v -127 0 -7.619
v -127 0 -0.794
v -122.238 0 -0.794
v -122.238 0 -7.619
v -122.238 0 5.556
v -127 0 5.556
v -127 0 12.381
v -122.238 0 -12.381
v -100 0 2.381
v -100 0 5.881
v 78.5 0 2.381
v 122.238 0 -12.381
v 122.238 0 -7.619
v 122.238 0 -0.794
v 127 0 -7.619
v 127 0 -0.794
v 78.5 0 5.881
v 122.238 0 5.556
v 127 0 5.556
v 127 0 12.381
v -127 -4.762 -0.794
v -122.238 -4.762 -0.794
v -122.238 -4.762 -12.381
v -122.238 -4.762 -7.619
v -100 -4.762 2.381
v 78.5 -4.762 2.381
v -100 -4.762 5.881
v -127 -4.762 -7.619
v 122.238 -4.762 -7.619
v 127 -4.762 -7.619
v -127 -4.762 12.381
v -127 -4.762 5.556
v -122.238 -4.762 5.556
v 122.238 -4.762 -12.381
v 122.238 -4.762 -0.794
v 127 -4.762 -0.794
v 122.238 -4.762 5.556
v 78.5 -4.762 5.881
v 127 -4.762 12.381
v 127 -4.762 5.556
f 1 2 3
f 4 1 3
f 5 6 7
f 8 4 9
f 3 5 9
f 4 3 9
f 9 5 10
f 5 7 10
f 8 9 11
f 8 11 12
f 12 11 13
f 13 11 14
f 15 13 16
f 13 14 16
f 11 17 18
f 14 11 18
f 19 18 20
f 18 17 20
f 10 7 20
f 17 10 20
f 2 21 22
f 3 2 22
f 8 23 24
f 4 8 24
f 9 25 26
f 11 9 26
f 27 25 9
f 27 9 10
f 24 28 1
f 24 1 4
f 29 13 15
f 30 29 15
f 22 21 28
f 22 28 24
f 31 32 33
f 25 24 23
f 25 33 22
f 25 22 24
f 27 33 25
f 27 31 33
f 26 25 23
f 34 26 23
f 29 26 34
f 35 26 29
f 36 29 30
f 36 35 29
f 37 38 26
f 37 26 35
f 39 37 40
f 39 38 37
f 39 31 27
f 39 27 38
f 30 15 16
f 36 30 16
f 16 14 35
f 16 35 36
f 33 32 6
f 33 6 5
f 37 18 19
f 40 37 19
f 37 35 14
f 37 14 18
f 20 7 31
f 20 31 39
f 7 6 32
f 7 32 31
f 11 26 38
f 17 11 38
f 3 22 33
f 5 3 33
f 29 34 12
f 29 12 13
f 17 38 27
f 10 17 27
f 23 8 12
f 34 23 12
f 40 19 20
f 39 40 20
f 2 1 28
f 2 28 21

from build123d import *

# Parameters (mm, degrees)
F0_W     = 254
F0_H     = 24.7625
F1_DEPTH = 4.7625
F2_W     = 4.7625
F2_H     = 6.35
F3_DEPTH = 25.4
F4_W     = 4.7625
F4_H     = 4.7625
F5_DEPTH = 25.4
F6_W     = 5.5
F6_H     = 3.5
F6_W_2   = 2.5
F6_W_3   = 3
F7_DEPTH = 25.4


with BuildPart() as f1:
    # F0 (on Front) → F1 (new body)
    with BuildSketch(Plane.XZ):
        Rectangle(F0_W, F0_H)
    extrude(amount=F1_DEPTH)

    # F2 (on face) → F3 (cut)
    with BuildSketch(Plane.XZ.offset(4.7625)):
        with Locations((-124.61875, 2.38125)):
            Rectangle(F2_W, F2_H)
        with Locations((124.61875, 2.38125)):
            Rectangle(F2_W, F2_H)
    extrude(amount=-F3_DEPTH, mode=Mode.SUBTRACT)

    # F4 (on face) → F5 (cut)
    with BuildSketch(Plane.XZ.offset(4.7625)):
        with Locations((124.61875, -10)):
            Rectangle(F4_W, F4_H)
        with Locations((-124.61875, -10)):
            Rectangle(F4_W, F4_H)
    extrude(amount=-F5_DEPTH, mode=Mode.SUBTRACT)

    # F6 (on face) → F7 (cut)
    with BuildSketch(Plane.XZ.offset(4.7625)):
        with Locations((-97.250009, 4.13125)):
            Rectangle(F6_W, F6_H)
        with Locations((-93.250009, 4.13125)):
            Rectangle(F6_W_2, F6_H)
        with Locations((-90.500009, 4.13125)):
            Rectangle(F6_W_3, F6_H)
        with Locations((-87.750009, 4.13125)):
            Rectangle(F6_W_2, F6_H)
        with Locations((-85.000009, 4.13125)):
            Rectangle(F6_W_3, F6_H)
        with Locations((-82.250009, 4.13125)):
            Rectangle(F6_W_2, F6_H)
        with Locations((-79.500009, 4.13125)):
            Rectangle(F6_W_3, F6_H)
        with Locations((-76.750009, 4.13125)):
            Rectangle(F6_W_2, F6_H)
        with Locations((-74.000009, 4.13125)):
            Rectangle(F6_W_3, F6_H)
        with Locations((-71.250009, 4.13125)):
            Rectangle(F6_W_2, F6_H)
        with Locations((-68.500009, 4.13125)):
            Rectangle(F6_W_3, F6_H)
        with Locations((-65.750009, 4.13125)):
            Rectangle(F6_W_2, F6_H)
        with Locations((-63.000009, 4.13125)):
            Rectangle(F6_W_3, F6_H)
        with Locations((-60.250009, 4.13125)):
            Rectangle(F6_W_2, F6_H)
        with Locations((-57.500009, 4.13125)):
            Rectangle(F6_W_3, F6_H)
        with Locations((-54.750009, 4.13125)):
            Rectangle(F6_W_2, F6_H)
        with Locations((-52.000009, 4.13125)):
            Rectangle(F6_W_3, F6_H)
        with Locations((-49.250009, 4.13125)):
            Rectangle(F6_W_2, F6_H)
        with Locations((-46.500009, 4.13125)):
            Rectangle(F6_W_3, F6_H)
        with Locations((-43.750009, 4.13125)):
            Rectangle(F6_W_2, F6_H)
        with Locations((-41.000009, 4.13125)):
            Rectangle(F6_W_3, F6_H)
        with Locations((-38.250009, 4.13125)):
            Rectangle(F6_W_2, F6_H)
        with Locations((-35.500009, 4.13125)):
            Rectangle(F6_W_3, F6_H)
        with Locations((-32.750009, 4.13125)):
            Rectangle(F6_W_2, F6_H)
        with Locations((-30.000009, 4.13125)):
            Rectangle(F6_W_3, F6_H)
        with Locations((-27.250009, 4.13125)):
            Rectangle(F6_W_2, F6_H)
        with Locations((-24.500009, 4.13125)):
            Rectangle(F6_W_3, F6_H)
        with Locations((-21.750009, 4.13125)):
            Rectangle(F6_W_2, F6_H)
        with Locations((-19.000009, 4.13125)):
            Rectangle(F6_W_3, F6_H)
        with Locations((-16.250009, 4.13125)):
            Rectangle(F6_W_2, F6_H)
        with Locations((-13.500009, 4.13125)):
            Rectangle(F6_W_3, F6_H)
        with Locations((-10.750009, 4.13125)):
            Rectangle(F6_W_2, F6_H)
        with Locations((-8.000009, 4.13125)):
            Rectangle(F6_W_3, F6_H)
        with Locations((-5.250009, 4.13125)):
            Rectangle(F6_W_2, F6_H)
        with Locations((-2.500009, 4.13125)):
            Rectangle(F6_W_3, F6_H)
        with Locations((0.249991, 4.13125)):
            Rectangle(F6_W_2, F6_H)
        with Locations((2.999991, 4.13125)):
            Rectangle(F6_W_3, F6_H)
        with Locations((5.749991, 4.13125)):
            Rectangle(F6_W_2, F6_H)
        with Locations((8.499991, 4.13125)):
            Rectangle(F6_W_3, F6_H)
        with Locations((11.249991, 4.13125)):
            Rectangle(F6_W_2, F6_H)
        with Locations((13.999991, 4.13125)):
            Rectangle(F6_W_3, F6_H)
        with Locations((16.749991, 4.13125)):
            Rectangle(F6_W_2, F6_H)
        with Locations((19.499991, 4.13125)):
            Rectangle(F6_W_3, F6_H)
        with Locations((22.249991, 4.13125)):
            Rectangle(F6_W_2, F6_H)
        with Locations((24.999991, 4.13125)):
            Rectangle(F6_W_3, F6_H)
        with Locations((27.749991, 4.13125)):
            Rectangle(F6_W_2, F6_H)
        with Locations((30.499991, 4.13125)):
            Rectangle(F6_W_3, F6_H)
        with Locations((33.249991, 4.13125)):
            Rectangle(F6_W_2, F6_H)
        with Locations((35.999991, 4.13125)):
            Rectangle(F6_W_3, F6_H)
        with Locations((38.749991, 4.13125)):
            Rectangle(F6_W_2, F6_H)
        with Locations((41.499991, 4.13125)):
            Rectangle(F6_W_3, F6_H)
        with Locations((44.249991, 4.13125)):
            Rectangle(F6_W_2, F6_H)
        with Locations((46.999991, 4.13125)):
            Rectangle(F6_W_3, F6_H)
        with Locations((49.749991, 4.13125)):
            Rectangle(F6_W_2, F6_H)
        with Locations((52.499991, 4.13125)):
            Rectangle(F6_W_3, F6_H)
        with Locations((55.249991, 4.13125)):
            Rectangle(F6_W_2, F6_H)
        with Locations((57.999991, 4.13125)):
            Rectangle(F6_W_3, F6_H)
        with Locations((60.749991, 4.13125)):
            Rectangle(F6_W_2, F6_H)
        with Locations((63.499991, 4.13125)):
            Rectangle(F6_W_3, F6_H)
        with Locations((66.249991, 4.13125)):
            Rectangle(F6_W_2, F6_H)
        with Locations((68.999991, 4.13125)):
            Rectangle(F6_W_3, F6_H)
        with Locations((71.749991, 4.13125)):
            Rectangle(F6_W_2, F6_H)
        with Locations((75.749991, 4.13125)):
            Rectangle(F6_W, F6_H)
    extrude(amount=-F7_DEPTH, mode=Mode.SUBTRACT)


solid = f1.part
